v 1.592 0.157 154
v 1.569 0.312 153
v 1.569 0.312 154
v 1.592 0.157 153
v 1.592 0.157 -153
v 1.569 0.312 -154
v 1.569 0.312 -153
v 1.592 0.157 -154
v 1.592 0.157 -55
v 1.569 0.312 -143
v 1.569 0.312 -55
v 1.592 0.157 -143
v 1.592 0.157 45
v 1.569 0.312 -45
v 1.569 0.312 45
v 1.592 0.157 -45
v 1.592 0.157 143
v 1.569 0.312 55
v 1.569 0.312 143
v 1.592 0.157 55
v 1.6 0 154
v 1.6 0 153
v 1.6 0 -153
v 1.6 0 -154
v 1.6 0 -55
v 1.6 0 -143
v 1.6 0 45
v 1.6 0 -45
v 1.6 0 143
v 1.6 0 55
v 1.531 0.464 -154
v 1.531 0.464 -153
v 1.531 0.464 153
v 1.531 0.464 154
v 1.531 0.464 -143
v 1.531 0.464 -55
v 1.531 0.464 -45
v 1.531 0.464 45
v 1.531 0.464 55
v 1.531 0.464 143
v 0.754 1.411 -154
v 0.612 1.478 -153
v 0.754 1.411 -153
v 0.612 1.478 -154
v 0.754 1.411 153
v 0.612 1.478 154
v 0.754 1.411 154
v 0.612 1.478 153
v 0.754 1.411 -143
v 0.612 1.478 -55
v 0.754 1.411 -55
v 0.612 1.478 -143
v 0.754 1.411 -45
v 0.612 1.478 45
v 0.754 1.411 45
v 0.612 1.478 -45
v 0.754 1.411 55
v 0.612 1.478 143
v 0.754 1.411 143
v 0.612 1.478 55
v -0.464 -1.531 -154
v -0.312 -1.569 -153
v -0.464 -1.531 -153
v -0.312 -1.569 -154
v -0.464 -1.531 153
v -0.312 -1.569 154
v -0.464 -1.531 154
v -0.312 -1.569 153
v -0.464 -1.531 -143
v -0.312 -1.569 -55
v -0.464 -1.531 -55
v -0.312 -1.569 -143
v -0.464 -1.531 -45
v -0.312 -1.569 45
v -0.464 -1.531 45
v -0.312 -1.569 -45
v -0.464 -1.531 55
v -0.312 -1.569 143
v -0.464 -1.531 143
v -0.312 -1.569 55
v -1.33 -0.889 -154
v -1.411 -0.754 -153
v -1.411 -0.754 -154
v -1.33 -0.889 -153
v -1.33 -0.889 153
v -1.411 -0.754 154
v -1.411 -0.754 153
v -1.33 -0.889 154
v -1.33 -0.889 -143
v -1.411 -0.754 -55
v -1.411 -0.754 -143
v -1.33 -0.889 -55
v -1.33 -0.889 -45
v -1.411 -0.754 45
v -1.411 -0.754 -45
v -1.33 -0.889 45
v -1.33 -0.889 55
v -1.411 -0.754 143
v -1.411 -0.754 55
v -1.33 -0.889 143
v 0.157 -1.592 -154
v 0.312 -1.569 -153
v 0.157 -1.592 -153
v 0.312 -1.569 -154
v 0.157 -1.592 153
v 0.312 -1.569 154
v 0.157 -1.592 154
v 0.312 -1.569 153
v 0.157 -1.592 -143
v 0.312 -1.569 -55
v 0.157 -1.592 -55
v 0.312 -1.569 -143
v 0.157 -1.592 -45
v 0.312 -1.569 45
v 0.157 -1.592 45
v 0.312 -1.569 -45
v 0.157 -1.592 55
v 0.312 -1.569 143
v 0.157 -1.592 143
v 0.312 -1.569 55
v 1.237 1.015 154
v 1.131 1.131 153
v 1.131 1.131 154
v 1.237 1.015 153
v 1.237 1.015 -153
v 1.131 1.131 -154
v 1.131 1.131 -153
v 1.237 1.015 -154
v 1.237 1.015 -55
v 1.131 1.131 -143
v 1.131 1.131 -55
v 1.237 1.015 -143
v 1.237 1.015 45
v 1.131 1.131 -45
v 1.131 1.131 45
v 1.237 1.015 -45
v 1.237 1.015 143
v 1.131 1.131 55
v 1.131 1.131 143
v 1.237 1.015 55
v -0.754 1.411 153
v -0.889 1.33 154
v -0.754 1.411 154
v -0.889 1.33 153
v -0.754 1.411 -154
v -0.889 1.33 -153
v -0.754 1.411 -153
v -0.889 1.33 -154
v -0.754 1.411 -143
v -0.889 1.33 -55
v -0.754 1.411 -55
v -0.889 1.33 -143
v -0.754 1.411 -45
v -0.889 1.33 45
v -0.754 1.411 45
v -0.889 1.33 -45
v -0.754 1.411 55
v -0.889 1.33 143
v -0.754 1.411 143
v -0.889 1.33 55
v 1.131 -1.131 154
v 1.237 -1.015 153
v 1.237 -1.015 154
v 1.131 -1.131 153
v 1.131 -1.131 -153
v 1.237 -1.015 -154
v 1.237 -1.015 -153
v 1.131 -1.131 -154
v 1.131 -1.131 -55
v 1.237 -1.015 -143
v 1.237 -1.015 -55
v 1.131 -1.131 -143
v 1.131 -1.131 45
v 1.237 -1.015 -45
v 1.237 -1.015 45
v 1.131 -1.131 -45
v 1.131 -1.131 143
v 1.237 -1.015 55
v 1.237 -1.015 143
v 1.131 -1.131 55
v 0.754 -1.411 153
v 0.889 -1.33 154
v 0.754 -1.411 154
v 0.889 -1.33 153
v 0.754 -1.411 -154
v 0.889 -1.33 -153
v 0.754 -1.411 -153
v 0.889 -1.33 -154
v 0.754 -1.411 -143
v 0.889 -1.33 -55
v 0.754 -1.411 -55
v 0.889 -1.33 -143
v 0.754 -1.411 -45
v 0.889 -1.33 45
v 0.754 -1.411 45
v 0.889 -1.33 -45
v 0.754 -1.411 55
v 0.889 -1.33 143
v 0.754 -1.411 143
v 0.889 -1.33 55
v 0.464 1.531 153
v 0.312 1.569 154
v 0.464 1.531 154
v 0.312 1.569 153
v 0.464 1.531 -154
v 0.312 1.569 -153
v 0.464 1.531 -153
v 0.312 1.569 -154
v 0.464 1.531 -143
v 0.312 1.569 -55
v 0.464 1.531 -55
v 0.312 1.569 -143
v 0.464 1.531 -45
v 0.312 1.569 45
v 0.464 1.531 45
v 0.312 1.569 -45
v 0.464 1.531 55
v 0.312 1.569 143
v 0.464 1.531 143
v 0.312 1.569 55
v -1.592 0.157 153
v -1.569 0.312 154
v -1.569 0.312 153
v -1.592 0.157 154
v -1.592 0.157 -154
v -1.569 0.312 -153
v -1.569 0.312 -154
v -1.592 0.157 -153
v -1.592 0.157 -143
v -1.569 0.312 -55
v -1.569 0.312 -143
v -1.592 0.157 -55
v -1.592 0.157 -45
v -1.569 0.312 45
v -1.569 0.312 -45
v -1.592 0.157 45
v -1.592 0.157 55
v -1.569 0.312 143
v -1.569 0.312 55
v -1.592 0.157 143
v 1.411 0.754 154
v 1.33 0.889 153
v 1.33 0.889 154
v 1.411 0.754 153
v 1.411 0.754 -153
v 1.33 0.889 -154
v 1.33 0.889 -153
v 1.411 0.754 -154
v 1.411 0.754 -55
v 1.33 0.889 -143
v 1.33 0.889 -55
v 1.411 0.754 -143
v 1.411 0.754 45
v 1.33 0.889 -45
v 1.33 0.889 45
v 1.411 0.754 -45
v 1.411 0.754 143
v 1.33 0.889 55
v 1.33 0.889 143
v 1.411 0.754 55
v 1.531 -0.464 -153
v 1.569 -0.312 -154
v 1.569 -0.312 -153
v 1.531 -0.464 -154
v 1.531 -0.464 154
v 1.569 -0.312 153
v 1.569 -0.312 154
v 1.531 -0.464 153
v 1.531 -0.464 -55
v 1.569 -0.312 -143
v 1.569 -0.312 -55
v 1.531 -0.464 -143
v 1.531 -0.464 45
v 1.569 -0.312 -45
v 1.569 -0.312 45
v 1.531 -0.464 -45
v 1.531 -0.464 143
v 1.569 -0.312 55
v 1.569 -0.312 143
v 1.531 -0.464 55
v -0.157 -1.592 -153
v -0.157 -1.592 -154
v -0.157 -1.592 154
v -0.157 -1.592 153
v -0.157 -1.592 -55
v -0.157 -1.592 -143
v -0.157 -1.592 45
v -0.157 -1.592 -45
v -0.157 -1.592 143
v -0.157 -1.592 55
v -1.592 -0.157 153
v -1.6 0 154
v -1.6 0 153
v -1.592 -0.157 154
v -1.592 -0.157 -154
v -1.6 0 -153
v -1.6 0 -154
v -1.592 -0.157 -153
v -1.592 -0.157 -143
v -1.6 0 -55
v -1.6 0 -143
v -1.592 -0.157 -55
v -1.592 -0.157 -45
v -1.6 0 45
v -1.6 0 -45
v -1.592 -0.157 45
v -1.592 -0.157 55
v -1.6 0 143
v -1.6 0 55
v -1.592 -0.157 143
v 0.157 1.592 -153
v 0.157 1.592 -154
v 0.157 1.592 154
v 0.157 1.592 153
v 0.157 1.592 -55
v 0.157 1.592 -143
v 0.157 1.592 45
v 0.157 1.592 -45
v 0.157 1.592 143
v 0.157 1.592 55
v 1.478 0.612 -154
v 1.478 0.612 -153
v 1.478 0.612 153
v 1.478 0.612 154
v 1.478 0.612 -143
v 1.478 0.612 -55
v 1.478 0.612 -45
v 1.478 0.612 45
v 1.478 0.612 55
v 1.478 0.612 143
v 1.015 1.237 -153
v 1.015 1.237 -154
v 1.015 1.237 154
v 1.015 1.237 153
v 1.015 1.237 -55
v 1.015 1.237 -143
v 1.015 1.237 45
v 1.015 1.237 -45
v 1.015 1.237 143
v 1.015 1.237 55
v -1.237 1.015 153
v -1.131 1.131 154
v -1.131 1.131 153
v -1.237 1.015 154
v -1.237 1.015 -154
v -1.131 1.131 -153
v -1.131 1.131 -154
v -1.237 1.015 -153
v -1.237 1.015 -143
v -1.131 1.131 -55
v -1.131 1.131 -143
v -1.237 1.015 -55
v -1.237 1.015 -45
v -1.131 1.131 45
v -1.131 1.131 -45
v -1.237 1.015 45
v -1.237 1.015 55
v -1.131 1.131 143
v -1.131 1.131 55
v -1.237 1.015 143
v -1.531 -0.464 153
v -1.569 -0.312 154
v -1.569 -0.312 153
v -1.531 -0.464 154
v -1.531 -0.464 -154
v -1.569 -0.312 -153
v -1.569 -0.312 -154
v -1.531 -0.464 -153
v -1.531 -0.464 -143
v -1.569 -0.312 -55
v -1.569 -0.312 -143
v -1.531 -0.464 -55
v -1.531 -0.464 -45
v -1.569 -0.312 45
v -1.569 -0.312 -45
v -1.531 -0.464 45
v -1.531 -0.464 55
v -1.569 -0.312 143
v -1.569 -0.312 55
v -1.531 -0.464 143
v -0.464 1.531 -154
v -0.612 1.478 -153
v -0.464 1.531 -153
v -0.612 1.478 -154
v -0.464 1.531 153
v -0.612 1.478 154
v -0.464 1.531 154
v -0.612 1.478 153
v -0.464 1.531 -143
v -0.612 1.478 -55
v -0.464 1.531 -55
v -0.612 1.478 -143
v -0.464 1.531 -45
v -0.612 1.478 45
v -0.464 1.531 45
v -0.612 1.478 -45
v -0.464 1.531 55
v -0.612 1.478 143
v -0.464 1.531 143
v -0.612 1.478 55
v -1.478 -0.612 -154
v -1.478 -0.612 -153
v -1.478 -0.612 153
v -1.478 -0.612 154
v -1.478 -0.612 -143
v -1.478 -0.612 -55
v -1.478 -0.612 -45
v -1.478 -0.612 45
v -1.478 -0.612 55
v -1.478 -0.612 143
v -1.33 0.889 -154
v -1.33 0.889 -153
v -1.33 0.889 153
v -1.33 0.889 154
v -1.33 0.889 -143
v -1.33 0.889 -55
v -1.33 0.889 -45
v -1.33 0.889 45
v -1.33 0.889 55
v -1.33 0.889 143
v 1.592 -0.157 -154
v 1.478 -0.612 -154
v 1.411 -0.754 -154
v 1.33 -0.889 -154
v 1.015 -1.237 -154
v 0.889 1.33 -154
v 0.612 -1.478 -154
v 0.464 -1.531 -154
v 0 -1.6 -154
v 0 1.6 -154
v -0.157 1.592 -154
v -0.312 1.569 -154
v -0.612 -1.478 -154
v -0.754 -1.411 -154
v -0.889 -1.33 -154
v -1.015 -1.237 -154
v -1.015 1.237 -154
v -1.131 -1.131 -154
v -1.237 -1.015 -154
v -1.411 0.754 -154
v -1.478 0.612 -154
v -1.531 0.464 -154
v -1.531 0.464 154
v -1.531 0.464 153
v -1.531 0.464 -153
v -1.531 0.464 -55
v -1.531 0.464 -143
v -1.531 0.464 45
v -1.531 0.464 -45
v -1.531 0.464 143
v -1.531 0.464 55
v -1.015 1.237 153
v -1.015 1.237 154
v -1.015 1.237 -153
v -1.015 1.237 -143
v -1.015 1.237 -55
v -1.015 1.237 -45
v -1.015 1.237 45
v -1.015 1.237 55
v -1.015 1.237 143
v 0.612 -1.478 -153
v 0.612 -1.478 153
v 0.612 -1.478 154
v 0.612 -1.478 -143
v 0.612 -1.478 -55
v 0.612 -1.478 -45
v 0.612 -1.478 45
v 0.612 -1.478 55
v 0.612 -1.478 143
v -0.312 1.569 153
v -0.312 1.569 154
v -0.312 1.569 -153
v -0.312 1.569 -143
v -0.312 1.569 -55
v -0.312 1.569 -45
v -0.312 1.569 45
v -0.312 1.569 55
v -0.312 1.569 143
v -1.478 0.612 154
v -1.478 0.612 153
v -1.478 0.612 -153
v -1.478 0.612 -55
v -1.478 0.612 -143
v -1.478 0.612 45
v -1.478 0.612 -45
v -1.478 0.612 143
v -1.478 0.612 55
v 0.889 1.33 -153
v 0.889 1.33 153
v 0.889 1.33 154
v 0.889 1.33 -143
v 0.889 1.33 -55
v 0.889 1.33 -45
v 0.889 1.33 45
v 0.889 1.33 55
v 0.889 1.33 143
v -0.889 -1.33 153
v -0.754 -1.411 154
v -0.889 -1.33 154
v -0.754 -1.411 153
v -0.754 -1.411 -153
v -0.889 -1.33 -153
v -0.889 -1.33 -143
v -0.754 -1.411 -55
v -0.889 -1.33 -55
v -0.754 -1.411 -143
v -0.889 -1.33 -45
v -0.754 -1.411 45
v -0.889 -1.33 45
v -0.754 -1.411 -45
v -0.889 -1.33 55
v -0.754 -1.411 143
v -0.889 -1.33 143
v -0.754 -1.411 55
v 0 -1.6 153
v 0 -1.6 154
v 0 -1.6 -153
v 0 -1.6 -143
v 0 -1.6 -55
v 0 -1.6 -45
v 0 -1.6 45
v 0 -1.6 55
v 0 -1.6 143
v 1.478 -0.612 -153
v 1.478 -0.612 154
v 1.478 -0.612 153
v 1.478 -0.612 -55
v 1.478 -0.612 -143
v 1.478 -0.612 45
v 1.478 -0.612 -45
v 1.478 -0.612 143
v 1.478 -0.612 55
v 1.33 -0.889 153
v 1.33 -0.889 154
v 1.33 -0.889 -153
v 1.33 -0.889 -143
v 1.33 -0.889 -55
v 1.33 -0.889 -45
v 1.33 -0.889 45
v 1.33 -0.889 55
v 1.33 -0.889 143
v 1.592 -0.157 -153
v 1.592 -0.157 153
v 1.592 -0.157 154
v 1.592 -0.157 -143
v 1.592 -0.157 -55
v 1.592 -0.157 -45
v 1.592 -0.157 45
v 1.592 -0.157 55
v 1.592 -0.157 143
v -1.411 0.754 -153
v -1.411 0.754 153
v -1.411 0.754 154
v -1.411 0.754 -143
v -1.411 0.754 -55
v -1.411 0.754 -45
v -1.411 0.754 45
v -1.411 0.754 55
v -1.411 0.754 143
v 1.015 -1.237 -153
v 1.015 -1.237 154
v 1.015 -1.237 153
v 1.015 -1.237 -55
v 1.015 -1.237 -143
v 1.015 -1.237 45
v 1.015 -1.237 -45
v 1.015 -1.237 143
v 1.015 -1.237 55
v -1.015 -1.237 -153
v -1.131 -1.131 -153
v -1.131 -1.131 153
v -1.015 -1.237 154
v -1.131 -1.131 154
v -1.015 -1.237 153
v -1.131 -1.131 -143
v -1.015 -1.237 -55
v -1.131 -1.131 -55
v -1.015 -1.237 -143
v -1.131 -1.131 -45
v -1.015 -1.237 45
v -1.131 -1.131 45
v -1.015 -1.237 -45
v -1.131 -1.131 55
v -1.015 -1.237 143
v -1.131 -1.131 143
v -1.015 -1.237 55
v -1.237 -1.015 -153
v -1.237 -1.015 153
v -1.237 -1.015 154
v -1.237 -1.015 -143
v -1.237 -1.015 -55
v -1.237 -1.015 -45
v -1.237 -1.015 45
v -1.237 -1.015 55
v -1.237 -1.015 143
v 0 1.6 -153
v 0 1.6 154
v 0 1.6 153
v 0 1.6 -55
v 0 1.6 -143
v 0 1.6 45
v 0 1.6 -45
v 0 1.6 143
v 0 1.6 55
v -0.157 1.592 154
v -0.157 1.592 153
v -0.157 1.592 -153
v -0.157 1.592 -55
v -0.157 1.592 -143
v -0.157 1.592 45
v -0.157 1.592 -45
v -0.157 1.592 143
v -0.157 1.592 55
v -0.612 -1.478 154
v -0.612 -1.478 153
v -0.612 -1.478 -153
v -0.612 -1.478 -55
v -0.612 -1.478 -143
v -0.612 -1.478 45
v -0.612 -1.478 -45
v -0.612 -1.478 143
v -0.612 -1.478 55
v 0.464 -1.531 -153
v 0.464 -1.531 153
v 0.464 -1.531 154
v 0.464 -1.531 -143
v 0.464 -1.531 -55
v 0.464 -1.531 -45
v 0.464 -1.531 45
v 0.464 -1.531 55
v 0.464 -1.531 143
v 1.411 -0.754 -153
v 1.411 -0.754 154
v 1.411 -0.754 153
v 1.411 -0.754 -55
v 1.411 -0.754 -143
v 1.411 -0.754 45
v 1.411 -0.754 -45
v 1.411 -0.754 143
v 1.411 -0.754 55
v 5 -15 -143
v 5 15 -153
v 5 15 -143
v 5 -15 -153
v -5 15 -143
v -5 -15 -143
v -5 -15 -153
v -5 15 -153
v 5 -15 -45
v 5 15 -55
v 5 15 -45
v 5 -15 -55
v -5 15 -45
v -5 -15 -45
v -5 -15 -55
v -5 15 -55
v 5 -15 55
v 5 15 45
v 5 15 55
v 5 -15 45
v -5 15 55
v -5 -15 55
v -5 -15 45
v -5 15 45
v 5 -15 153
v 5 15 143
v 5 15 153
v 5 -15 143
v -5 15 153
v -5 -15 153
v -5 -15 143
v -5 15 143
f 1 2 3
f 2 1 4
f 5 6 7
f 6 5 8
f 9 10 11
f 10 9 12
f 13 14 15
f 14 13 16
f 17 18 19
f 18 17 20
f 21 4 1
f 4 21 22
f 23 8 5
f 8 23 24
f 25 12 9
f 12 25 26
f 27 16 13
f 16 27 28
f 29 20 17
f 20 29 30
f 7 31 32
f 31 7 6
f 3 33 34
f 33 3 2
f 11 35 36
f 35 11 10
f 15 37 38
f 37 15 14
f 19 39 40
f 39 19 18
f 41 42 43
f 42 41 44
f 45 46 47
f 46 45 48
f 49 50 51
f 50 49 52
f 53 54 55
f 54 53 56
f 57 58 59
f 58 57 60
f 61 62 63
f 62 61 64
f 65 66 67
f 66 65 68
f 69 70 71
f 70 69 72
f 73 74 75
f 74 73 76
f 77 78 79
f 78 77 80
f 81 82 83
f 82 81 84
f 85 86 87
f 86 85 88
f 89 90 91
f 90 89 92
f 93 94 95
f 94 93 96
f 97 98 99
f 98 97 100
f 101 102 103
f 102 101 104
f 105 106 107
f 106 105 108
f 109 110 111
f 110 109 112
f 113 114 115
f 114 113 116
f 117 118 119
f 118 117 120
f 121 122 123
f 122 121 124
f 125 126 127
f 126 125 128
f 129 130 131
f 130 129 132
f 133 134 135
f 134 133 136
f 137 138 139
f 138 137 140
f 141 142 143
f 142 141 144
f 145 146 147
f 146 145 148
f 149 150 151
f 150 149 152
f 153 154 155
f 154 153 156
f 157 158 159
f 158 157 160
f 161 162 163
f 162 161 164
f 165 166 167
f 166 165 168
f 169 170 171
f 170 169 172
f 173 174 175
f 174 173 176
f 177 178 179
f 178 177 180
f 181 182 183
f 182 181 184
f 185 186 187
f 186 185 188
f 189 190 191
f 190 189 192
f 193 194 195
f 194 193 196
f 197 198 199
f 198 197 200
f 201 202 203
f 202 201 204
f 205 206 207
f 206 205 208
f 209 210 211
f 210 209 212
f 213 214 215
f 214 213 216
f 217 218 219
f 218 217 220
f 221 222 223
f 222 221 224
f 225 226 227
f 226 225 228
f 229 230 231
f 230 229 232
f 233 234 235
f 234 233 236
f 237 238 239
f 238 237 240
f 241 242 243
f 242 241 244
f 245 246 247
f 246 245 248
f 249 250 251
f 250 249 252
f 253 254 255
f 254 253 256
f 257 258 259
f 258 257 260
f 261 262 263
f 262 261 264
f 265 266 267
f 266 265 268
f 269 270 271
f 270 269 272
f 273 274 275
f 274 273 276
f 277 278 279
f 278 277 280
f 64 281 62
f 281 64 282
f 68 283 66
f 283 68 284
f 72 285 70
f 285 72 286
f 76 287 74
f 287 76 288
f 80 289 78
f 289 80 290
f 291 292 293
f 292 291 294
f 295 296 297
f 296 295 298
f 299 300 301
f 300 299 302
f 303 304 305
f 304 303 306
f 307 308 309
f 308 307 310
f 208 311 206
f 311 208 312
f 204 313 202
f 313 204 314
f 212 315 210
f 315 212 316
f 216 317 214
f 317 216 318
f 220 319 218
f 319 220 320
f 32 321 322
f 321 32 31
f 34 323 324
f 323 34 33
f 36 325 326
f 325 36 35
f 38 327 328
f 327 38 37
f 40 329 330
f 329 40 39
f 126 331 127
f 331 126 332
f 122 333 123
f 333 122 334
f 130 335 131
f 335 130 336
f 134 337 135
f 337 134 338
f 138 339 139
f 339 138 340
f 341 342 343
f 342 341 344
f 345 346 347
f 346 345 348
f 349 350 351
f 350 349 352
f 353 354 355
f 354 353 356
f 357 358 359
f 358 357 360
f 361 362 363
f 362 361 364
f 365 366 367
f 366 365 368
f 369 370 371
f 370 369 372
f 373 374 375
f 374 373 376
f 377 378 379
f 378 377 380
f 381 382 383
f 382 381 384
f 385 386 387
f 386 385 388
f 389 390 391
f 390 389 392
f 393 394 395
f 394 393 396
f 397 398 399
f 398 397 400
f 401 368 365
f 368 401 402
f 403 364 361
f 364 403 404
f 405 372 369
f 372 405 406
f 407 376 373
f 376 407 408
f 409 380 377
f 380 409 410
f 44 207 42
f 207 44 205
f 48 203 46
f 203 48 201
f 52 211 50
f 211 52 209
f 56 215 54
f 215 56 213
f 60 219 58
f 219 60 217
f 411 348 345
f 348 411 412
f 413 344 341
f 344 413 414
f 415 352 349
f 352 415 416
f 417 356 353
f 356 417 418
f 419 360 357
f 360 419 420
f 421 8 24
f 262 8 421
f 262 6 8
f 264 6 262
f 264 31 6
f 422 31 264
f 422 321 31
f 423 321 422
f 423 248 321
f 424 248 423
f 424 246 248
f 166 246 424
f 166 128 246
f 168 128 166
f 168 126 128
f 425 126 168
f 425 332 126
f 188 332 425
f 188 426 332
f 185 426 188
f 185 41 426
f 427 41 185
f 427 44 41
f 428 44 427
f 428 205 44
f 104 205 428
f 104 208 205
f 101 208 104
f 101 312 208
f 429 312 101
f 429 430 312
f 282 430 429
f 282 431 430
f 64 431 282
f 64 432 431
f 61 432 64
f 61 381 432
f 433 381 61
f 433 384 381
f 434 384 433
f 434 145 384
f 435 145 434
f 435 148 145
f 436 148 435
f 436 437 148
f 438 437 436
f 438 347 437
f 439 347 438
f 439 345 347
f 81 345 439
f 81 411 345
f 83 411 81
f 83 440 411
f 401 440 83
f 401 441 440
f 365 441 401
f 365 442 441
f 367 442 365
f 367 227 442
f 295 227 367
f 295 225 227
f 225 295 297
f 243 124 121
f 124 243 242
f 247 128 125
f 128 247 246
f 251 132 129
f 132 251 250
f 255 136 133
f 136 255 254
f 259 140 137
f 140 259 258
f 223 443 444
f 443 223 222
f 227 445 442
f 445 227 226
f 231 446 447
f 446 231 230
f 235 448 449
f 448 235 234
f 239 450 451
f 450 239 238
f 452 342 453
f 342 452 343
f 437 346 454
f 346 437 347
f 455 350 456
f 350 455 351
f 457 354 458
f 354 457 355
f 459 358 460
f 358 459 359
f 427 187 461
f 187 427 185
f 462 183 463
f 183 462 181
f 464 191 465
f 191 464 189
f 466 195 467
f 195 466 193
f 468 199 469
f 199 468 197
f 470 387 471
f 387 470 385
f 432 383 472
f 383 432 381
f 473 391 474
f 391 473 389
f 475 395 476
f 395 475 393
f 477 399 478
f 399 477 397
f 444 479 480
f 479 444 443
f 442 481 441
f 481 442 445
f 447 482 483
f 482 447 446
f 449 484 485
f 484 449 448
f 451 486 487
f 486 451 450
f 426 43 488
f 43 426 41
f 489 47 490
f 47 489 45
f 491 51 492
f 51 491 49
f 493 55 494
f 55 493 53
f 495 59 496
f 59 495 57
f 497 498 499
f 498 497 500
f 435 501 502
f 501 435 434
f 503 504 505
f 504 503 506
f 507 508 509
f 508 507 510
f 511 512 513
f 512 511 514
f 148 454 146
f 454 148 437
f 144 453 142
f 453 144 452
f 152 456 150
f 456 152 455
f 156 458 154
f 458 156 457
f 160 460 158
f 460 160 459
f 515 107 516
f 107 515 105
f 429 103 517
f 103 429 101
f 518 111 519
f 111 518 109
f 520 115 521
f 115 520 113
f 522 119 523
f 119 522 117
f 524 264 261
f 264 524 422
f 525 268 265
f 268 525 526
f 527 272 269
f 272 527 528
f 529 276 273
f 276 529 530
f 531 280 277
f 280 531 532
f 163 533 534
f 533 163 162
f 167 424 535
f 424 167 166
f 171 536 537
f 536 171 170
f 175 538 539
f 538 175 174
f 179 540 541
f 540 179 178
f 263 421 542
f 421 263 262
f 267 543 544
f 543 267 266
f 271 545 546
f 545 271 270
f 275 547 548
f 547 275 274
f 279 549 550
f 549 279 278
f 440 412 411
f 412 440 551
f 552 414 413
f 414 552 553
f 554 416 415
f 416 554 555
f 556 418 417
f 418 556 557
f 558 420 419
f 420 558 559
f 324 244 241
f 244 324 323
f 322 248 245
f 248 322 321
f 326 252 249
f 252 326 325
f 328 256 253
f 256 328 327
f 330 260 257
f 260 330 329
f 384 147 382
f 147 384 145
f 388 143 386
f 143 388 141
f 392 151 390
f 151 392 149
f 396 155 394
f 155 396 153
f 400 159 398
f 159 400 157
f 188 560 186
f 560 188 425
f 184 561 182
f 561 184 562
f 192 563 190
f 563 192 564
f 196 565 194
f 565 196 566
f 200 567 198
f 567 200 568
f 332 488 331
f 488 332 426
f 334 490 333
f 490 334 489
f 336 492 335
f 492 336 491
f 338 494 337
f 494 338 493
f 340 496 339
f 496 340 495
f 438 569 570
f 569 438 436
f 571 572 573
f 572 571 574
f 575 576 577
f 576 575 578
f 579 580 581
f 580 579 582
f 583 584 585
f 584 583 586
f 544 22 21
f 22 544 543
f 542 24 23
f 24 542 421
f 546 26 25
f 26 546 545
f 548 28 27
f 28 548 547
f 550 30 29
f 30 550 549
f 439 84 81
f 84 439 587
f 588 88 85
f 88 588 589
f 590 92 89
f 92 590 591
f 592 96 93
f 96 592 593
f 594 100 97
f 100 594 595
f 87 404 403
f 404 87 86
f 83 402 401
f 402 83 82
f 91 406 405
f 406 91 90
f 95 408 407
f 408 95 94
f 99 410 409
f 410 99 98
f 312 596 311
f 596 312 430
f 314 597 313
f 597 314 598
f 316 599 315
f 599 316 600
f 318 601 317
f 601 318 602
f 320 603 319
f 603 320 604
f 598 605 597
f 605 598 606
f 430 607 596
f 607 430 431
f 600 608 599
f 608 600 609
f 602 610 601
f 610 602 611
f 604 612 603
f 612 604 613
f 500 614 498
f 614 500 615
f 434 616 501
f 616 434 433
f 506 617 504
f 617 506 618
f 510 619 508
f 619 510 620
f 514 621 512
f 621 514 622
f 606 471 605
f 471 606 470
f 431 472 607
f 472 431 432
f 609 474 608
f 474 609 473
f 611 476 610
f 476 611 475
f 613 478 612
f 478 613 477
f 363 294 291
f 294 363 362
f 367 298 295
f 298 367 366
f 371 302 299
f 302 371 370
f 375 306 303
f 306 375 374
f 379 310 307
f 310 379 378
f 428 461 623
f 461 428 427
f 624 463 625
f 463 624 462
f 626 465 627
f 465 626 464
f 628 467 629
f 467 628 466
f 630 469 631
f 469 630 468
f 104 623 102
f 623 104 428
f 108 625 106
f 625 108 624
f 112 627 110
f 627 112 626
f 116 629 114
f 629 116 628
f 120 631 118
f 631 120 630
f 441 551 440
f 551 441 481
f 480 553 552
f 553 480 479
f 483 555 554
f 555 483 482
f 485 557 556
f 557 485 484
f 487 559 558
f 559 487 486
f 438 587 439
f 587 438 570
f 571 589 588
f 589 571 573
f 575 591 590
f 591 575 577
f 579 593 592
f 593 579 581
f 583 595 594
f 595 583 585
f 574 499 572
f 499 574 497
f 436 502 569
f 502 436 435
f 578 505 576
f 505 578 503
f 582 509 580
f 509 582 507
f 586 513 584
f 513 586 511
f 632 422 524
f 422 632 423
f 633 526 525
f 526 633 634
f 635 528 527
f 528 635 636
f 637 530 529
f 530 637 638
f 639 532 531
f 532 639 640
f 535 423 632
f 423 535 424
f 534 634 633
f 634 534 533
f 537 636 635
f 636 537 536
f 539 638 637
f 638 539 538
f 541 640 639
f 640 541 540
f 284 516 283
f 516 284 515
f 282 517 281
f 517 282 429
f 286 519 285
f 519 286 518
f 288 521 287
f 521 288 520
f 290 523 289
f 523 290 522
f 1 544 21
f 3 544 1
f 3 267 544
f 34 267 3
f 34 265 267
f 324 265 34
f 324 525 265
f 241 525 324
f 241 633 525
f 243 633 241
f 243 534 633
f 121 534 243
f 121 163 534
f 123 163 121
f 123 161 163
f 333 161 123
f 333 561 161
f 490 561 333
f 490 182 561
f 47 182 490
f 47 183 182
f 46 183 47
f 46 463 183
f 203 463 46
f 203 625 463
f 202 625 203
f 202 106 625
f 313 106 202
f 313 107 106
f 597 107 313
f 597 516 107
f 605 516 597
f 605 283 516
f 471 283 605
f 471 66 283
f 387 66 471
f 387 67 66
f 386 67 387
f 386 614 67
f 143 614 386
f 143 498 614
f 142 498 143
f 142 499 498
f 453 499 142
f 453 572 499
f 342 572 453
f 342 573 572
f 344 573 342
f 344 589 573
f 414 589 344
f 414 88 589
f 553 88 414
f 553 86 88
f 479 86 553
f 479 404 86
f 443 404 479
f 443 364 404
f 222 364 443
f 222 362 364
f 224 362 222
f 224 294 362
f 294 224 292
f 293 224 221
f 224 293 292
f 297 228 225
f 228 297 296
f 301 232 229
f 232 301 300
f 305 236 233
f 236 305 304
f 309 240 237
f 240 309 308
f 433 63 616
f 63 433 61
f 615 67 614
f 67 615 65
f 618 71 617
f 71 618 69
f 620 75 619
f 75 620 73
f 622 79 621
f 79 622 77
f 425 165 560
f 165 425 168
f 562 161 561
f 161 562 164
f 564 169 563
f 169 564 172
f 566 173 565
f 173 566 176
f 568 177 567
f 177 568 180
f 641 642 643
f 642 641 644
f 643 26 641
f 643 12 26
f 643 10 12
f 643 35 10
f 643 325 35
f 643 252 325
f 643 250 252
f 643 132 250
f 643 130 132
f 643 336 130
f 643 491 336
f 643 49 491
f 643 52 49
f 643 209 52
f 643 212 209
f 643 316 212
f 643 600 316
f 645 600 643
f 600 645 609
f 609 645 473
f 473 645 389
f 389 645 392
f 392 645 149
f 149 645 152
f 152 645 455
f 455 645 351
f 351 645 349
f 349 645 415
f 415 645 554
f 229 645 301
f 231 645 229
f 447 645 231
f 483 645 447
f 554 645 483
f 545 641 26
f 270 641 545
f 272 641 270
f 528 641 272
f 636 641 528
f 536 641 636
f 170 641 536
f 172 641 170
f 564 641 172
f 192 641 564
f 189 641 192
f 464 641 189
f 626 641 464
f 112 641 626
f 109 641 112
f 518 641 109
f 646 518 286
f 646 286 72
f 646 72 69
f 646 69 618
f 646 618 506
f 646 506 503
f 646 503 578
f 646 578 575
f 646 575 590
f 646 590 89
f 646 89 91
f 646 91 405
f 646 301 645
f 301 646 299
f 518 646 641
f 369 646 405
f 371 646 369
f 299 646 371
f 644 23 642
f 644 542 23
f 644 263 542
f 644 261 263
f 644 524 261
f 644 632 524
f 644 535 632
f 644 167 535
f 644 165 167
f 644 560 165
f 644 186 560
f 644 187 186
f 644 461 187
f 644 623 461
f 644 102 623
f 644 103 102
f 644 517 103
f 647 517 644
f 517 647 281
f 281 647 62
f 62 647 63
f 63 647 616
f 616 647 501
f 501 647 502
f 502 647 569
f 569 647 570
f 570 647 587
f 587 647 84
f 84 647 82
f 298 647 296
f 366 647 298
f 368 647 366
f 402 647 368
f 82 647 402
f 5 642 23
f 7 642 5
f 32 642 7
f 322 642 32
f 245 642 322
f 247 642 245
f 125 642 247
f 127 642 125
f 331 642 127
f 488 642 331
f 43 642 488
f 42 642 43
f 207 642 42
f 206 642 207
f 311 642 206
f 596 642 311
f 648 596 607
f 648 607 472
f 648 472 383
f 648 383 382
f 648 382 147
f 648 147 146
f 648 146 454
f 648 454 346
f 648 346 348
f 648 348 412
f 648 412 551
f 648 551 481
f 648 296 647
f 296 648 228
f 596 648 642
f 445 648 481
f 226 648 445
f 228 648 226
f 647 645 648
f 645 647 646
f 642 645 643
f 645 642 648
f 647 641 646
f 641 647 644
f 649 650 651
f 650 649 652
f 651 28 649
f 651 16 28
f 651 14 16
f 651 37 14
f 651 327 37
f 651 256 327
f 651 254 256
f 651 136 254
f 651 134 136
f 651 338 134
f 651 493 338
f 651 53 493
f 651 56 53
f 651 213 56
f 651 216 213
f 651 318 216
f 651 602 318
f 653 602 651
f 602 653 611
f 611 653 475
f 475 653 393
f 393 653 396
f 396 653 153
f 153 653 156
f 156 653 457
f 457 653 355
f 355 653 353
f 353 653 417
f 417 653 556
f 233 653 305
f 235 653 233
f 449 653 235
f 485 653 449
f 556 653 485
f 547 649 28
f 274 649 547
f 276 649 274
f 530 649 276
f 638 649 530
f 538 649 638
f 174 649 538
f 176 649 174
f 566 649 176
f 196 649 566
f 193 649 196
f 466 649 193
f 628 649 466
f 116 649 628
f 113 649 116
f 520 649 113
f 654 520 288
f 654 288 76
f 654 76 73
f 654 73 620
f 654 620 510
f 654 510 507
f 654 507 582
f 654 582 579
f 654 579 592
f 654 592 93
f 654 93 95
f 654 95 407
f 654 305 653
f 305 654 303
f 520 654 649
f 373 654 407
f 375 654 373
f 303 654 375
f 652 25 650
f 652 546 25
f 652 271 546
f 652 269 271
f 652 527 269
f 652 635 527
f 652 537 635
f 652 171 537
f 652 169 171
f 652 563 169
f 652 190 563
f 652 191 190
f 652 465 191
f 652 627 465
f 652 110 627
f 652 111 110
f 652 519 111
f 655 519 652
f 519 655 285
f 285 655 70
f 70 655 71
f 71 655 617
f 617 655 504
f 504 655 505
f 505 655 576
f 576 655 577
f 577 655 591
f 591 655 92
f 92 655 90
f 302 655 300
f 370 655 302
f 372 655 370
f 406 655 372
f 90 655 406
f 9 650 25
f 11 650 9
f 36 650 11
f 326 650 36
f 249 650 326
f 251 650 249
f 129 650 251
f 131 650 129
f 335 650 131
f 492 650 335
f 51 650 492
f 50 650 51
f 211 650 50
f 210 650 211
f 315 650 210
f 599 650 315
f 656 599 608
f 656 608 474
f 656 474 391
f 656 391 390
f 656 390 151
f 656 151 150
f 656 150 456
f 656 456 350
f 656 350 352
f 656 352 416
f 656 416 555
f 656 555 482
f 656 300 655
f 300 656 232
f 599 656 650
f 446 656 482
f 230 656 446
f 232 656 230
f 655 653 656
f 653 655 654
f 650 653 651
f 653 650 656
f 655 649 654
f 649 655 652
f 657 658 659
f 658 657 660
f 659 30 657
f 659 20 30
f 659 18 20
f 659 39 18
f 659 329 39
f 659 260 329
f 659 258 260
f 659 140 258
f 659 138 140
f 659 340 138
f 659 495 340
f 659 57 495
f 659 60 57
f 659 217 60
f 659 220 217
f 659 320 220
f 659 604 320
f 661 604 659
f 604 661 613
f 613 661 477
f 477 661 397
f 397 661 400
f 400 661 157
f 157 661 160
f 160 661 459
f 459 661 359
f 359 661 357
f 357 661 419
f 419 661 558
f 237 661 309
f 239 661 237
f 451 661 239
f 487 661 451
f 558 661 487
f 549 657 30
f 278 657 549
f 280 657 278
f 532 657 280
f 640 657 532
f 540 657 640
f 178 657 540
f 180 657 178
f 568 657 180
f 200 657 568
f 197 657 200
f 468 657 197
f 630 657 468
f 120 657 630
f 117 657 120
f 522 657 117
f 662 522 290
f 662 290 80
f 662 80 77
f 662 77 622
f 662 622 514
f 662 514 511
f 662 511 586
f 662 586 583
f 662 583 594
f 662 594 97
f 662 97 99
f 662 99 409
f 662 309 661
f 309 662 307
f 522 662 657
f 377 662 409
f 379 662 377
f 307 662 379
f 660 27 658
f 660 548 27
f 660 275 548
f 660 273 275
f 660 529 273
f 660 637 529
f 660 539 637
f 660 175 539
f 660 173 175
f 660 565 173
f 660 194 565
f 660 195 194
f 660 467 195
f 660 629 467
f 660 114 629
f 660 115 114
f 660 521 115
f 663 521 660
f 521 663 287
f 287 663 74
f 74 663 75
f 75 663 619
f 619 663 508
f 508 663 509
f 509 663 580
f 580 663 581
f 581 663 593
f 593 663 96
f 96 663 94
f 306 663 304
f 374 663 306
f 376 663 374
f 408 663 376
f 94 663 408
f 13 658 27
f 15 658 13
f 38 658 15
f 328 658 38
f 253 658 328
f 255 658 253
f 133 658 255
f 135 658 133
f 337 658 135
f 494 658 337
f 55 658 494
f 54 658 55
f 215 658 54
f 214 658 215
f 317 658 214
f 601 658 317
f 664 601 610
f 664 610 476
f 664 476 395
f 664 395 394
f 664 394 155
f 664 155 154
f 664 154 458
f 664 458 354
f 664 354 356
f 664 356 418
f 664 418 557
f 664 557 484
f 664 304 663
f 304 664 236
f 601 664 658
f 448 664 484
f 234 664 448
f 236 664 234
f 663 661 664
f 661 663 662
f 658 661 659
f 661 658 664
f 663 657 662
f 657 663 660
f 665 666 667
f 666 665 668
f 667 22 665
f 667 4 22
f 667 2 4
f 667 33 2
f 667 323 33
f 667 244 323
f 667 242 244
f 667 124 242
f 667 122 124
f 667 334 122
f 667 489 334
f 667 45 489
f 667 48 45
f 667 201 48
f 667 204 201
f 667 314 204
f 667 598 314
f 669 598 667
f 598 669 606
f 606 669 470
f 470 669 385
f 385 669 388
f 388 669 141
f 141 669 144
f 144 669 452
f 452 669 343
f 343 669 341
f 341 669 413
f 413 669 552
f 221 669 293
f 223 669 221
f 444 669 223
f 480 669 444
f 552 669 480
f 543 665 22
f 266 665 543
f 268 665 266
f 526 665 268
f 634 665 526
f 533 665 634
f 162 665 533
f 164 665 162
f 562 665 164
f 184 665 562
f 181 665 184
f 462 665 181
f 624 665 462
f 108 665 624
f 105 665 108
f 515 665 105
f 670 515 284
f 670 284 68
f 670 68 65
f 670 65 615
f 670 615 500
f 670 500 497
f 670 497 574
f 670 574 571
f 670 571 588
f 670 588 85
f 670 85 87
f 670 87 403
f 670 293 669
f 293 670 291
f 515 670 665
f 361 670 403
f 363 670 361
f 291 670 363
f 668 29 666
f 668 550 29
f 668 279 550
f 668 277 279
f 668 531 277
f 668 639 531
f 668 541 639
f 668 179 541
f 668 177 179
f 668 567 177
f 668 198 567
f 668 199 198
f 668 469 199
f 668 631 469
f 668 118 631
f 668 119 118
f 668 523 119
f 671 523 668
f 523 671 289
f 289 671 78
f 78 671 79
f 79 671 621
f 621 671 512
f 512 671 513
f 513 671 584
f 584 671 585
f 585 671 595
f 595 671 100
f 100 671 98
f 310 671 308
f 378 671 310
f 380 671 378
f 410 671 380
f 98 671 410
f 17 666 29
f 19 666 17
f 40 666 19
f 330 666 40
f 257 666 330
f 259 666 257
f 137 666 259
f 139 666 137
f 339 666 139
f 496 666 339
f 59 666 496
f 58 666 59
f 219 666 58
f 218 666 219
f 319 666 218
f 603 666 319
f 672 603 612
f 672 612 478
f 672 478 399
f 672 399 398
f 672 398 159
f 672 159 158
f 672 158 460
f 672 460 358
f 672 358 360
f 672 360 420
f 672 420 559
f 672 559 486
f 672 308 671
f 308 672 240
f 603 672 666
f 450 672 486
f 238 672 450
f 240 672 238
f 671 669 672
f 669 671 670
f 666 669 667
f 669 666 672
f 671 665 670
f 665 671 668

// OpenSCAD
// ============================================================================
// Atom Lithography Machine — Parametric OpenSCAD Module (S9.4-03)
// ============================================================================
// part_id           : S9.4-03
// parent_bom_id     : S9.4
// subsystem         : S9
// part_name         : Option-Q 4x NbTi Superiletken qRAM Kopru Koaksiyel + 1x 1550 nm SMF-28 Kriyo-Fiber Demeti (Exp142 S9.1-03, 0.82 kg)
// material          : OFHC Cu
// temp_stage        : 300 K -> 20 mK
// vacuum_grade      : Kriyo-vakum
// tolerance         : <=0.1 dB/m (NbTi)
// computed_mass_kg  : 0.11718
// envelope_mm       : 10.000 x 30.000 x 308.000
// design_maturity   : M0_M1_DETAILED_CAD_DESIGN_ONLY
// no_lab_measurement: true
// iec61508_certified: false
// semi_s2_certified : false
// Units: millimeters (mm)
// ============================================================================

$fn = 64;

// Nominal bounding envelope parameters (mm)
bbox_x = 10.0000;
bbox_y = 30.0000;
bbox_z = 308.0000;

// Part-specific parametric dimensions
n_nbti_coax = 4;
n_smf28_fiber = 1;
n_clamps = 4;
mass_kg = 0.82;

// Interface / port parameters (mm)

module part_S9_4_03() {
  union() {
    // 1550 nm SMF-28 cryo-fiber jacket
    cylinder(d=3.200, h=308.000, center=true);
    // Cryo-fiber thermal anchor clamp #1
    translate([0.000, 0.000, -148.000]) cube([10.000, 30.000, 10.000], center=true);
    // Cryo-fiber thermal anchor clamp #2
    translate([0.000, 0.000, -50.000]) cube([10.000, 30.000, 10.000], center=true);
    // Cryo-fiber thermal anchor clamp #3
    translate([0.000, 0.000, 50.000]) cube([10.000, 30.000, 10.000], center=true);
    // Cryo-fiber thermal anchor clamp #4
    translate([0.000, 0.000, 148.000]) cube([10.000, 30.000, 10.000], center=true);
  }
}

// World assembly mounting transform (global machine frame, mm / deg):
// translate([-793.000, 0.000, 560.000]) rotate([0.000, 0.000, 0.000]) part_S9_4_03();

part_S9_4_03();
